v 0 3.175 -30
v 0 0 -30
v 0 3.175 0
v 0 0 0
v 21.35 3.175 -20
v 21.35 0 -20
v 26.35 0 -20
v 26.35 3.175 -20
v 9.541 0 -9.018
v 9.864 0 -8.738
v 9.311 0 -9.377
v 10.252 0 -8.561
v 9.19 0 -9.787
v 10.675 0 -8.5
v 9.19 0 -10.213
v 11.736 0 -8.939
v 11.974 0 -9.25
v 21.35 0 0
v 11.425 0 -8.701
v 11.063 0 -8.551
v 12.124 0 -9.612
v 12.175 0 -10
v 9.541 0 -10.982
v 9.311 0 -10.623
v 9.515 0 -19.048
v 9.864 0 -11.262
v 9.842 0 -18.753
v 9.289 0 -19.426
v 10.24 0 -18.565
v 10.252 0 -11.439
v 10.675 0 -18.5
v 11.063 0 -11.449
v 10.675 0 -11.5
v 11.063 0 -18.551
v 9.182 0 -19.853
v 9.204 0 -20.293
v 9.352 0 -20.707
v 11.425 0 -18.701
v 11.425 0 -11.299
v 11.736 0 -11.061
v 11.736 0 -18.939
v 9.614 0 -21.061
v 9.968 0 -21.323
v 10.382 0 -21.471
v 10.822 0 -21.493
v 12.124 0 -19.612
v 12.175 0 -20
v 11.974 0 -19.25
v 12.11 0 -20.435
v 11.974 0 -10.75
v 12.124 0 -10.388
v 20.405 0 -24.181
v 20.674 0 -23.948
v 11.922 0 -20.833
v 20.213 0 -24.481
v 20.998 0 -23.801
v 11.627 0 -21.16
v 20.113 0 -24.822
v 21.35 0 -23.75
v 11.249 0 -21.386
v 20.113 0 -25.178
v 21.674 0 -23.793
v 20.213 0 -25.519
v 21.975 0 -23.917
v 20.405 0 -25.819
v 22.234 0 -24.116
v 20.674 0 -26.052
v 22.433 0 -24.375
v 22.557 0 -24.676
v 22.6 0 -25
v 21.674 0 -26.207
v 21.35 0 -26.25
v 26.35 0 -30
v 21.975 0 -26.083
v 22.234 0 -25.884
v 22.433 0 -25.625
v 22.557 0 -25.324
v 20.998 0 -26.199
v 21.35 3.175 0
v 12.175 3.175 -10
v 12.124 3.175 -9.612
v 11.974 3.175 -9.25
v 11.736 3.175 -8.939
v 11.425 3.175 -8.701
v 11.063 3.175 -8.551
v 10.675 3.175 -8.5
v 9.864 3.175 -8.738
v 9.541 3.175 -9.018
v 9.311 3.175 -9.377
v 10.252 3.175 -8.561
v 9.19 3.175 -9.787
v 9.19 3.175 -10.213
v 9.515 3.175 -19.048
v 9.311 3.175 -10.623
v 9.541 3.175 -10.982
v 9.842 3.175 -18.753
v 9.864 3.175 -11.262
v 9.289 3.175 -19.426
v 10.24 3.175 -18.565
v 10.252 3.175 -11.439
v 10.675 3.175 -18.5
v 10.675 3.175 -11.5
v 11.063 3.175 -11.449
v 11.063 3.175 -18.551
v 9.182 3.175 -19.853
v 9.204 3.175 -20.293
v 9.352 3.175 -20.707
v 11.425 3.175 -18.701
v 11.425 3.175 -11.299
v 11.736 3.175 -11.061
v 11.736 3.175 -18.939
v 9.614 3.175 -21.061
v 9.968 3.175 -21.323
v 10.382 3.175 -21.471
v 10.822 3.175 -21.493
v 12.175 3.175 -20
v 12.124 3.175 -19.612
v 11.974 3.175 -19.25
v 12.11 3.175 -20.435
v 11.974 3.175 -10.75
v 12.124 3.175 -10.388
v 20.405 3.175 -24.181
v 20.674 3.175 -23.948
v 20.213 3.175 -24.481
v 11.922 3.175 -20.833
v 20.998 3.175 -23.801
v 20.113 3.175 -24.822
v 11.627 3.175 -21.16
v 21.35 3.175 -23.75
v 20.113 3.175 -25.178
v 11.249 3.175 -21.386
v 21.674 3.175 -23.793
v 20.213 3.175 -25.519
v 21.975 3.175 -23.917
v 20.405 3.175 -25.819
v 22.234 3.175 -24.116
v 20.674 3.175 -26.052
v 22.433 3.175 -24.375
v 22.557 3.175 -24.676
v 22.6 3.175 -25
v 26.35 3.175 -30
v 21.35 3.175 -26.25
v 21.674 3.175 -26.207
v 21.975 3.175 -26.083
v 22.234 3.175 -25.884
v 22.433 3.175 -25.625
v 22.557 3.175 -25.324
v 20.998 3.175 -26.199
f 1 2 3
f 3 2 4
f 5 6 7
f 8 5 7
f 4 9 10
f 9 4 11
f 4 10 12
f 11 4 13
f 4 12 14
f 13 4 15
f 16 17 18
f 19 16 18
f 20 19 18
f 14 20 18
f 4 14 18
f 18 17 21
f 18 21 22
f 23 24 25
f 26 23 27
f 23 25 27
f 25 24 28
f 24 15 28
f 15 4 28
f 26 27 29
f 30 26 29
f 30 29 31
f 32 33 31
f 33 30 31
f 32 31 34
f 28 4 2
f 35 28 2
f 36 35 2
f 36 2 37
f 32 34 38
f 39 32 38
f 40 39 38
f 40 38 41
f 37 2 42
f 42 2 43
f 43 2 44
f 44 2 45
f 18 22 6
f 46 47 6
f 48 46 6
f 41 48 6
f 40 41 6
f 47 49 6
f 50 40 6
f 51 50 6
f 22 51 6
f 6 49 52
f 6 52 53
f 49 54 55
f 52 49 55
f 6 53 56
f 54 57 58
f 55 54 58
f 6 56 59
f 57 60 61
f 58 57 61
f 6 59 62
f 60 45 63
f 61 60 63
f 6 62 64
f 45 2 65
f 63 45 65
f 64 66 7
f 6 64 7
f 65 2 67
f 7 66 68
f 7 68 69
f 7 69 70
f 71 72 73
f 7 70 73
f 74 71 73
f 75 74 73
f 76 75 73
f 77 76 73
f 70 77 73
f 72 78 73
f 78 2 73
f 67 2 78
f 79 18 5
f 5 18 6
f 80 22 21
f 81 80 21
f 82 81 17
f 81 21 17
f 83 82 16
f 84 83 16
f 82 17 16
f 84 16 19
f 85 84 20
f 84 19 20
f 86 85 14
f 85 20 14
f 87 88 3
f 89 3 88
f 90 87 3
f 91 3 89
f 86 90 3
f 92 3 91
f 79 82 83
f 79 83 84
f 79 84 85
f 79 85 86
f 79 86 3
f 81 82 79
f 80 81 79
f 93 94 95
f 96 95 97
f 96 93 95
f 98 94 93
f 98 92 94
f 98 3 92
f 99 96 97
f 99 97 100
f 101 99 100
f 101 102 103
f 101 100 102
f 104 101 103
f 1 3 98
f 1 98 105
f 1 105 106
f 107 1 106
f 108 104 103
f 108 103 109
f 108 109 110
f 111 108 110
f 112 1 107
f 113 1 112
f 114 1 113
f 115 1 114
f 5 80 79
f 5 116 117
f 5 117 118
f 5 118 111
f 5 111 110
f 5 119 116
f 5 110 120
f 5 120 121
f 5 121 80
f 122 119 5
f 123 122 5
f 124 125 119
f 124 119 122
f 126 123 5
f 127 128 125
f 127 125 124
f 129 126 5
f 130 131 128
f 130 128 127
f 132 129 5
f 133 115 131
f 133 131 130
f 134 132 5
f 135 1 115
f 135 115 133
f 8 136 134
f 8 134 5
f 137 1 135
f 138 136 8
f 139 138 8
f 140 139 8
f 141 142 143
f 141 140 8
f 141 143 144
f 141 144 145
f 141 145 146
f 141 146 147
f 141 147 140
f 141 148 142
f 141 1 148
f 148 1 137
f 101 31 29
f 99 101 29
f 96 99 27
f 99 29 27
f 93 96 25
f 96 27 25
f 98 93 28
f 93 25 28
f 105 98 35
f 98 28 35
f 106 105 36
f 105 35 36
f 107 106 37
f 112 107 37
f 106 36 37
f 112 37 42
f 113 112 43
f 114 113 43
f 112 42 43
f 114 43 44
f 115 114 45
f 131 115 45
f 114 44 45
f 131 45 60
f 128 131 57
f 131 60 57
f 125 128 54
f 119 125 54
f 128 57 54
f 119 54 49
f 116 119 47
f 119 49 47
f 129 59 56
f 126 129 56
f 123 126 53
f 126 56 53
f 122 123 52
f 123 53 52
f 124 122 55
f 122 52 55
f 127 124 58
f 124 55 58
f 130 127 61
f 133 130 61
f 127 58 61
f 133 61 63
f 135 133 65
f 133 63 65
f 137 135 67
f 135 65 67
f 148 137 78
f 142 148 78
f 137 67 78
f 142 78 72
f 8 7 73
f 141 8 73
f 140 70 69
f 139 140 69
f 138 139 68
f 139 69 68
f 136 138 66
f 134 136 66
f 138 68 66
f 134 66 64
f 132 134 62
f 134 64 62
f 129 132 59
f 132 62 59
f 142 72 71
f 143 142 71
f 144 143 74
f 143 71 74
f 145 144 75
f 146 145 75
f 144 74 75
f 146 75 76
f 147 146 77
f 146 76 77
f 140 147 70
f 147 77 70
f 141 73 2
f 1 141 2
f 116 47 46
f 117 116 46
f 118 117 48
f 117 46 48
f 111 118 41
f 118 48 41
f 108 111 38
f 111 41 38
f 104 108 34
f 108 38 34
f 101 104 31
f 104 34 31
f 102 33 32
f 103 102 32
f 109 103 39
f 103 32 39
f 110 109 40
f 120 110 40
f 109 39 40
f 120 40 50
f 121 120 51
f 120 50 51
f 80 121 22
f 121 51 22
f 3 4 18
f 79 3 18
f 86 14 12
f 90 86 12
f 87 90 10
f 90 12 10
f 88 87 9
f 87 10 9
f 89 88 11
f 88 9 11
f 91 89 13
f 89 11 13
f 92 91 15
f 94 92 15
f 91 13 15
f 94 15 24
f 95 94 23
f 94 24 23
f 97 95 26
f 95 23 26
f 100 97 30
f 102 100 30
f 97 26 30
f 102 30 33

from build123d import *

# Parameters (mm, degrees)
SKETCH1_R           = 1.25
SKETCH1_R_2         = 1.5
BOSS_EXTRUDE1_DEPTH = 3.175


with BuildPart() as part:
    # Sketch1 → Boss-Extrude1 (new body)
    with BuildSketch(Plane(origin=(0, 0, 0), x_dir=(1, 0, 0), z_dir=(0, 1, 0))):
        Polygon((0, 0), (10.675, 0), (21.35, 0), (21.35, 20), (26.35, 20), (26.35, 30), (0, 30), align=None)
        with Locations((21.35, 25)):
            Circle(SKETCH1_R, mode=Mode.SUBTRACT)
        with BuildLine():
            ThreePointArc((10.675, 8.5), (9.175, 10), (10.675, 11.5))
            ThreePointArc((10.675, 11.5), (12.175, 10), (10.675, 8.5))
        make_face(mode=Mode.SUBTRACT)
        with Locations((10.675, 20)):
            Circle(SKETCH1_R_2, mode=Mode.SUBTRACT)
    extrude(amount=BOSS_EXTRUDE1_DEPTH)


solid = part.part
